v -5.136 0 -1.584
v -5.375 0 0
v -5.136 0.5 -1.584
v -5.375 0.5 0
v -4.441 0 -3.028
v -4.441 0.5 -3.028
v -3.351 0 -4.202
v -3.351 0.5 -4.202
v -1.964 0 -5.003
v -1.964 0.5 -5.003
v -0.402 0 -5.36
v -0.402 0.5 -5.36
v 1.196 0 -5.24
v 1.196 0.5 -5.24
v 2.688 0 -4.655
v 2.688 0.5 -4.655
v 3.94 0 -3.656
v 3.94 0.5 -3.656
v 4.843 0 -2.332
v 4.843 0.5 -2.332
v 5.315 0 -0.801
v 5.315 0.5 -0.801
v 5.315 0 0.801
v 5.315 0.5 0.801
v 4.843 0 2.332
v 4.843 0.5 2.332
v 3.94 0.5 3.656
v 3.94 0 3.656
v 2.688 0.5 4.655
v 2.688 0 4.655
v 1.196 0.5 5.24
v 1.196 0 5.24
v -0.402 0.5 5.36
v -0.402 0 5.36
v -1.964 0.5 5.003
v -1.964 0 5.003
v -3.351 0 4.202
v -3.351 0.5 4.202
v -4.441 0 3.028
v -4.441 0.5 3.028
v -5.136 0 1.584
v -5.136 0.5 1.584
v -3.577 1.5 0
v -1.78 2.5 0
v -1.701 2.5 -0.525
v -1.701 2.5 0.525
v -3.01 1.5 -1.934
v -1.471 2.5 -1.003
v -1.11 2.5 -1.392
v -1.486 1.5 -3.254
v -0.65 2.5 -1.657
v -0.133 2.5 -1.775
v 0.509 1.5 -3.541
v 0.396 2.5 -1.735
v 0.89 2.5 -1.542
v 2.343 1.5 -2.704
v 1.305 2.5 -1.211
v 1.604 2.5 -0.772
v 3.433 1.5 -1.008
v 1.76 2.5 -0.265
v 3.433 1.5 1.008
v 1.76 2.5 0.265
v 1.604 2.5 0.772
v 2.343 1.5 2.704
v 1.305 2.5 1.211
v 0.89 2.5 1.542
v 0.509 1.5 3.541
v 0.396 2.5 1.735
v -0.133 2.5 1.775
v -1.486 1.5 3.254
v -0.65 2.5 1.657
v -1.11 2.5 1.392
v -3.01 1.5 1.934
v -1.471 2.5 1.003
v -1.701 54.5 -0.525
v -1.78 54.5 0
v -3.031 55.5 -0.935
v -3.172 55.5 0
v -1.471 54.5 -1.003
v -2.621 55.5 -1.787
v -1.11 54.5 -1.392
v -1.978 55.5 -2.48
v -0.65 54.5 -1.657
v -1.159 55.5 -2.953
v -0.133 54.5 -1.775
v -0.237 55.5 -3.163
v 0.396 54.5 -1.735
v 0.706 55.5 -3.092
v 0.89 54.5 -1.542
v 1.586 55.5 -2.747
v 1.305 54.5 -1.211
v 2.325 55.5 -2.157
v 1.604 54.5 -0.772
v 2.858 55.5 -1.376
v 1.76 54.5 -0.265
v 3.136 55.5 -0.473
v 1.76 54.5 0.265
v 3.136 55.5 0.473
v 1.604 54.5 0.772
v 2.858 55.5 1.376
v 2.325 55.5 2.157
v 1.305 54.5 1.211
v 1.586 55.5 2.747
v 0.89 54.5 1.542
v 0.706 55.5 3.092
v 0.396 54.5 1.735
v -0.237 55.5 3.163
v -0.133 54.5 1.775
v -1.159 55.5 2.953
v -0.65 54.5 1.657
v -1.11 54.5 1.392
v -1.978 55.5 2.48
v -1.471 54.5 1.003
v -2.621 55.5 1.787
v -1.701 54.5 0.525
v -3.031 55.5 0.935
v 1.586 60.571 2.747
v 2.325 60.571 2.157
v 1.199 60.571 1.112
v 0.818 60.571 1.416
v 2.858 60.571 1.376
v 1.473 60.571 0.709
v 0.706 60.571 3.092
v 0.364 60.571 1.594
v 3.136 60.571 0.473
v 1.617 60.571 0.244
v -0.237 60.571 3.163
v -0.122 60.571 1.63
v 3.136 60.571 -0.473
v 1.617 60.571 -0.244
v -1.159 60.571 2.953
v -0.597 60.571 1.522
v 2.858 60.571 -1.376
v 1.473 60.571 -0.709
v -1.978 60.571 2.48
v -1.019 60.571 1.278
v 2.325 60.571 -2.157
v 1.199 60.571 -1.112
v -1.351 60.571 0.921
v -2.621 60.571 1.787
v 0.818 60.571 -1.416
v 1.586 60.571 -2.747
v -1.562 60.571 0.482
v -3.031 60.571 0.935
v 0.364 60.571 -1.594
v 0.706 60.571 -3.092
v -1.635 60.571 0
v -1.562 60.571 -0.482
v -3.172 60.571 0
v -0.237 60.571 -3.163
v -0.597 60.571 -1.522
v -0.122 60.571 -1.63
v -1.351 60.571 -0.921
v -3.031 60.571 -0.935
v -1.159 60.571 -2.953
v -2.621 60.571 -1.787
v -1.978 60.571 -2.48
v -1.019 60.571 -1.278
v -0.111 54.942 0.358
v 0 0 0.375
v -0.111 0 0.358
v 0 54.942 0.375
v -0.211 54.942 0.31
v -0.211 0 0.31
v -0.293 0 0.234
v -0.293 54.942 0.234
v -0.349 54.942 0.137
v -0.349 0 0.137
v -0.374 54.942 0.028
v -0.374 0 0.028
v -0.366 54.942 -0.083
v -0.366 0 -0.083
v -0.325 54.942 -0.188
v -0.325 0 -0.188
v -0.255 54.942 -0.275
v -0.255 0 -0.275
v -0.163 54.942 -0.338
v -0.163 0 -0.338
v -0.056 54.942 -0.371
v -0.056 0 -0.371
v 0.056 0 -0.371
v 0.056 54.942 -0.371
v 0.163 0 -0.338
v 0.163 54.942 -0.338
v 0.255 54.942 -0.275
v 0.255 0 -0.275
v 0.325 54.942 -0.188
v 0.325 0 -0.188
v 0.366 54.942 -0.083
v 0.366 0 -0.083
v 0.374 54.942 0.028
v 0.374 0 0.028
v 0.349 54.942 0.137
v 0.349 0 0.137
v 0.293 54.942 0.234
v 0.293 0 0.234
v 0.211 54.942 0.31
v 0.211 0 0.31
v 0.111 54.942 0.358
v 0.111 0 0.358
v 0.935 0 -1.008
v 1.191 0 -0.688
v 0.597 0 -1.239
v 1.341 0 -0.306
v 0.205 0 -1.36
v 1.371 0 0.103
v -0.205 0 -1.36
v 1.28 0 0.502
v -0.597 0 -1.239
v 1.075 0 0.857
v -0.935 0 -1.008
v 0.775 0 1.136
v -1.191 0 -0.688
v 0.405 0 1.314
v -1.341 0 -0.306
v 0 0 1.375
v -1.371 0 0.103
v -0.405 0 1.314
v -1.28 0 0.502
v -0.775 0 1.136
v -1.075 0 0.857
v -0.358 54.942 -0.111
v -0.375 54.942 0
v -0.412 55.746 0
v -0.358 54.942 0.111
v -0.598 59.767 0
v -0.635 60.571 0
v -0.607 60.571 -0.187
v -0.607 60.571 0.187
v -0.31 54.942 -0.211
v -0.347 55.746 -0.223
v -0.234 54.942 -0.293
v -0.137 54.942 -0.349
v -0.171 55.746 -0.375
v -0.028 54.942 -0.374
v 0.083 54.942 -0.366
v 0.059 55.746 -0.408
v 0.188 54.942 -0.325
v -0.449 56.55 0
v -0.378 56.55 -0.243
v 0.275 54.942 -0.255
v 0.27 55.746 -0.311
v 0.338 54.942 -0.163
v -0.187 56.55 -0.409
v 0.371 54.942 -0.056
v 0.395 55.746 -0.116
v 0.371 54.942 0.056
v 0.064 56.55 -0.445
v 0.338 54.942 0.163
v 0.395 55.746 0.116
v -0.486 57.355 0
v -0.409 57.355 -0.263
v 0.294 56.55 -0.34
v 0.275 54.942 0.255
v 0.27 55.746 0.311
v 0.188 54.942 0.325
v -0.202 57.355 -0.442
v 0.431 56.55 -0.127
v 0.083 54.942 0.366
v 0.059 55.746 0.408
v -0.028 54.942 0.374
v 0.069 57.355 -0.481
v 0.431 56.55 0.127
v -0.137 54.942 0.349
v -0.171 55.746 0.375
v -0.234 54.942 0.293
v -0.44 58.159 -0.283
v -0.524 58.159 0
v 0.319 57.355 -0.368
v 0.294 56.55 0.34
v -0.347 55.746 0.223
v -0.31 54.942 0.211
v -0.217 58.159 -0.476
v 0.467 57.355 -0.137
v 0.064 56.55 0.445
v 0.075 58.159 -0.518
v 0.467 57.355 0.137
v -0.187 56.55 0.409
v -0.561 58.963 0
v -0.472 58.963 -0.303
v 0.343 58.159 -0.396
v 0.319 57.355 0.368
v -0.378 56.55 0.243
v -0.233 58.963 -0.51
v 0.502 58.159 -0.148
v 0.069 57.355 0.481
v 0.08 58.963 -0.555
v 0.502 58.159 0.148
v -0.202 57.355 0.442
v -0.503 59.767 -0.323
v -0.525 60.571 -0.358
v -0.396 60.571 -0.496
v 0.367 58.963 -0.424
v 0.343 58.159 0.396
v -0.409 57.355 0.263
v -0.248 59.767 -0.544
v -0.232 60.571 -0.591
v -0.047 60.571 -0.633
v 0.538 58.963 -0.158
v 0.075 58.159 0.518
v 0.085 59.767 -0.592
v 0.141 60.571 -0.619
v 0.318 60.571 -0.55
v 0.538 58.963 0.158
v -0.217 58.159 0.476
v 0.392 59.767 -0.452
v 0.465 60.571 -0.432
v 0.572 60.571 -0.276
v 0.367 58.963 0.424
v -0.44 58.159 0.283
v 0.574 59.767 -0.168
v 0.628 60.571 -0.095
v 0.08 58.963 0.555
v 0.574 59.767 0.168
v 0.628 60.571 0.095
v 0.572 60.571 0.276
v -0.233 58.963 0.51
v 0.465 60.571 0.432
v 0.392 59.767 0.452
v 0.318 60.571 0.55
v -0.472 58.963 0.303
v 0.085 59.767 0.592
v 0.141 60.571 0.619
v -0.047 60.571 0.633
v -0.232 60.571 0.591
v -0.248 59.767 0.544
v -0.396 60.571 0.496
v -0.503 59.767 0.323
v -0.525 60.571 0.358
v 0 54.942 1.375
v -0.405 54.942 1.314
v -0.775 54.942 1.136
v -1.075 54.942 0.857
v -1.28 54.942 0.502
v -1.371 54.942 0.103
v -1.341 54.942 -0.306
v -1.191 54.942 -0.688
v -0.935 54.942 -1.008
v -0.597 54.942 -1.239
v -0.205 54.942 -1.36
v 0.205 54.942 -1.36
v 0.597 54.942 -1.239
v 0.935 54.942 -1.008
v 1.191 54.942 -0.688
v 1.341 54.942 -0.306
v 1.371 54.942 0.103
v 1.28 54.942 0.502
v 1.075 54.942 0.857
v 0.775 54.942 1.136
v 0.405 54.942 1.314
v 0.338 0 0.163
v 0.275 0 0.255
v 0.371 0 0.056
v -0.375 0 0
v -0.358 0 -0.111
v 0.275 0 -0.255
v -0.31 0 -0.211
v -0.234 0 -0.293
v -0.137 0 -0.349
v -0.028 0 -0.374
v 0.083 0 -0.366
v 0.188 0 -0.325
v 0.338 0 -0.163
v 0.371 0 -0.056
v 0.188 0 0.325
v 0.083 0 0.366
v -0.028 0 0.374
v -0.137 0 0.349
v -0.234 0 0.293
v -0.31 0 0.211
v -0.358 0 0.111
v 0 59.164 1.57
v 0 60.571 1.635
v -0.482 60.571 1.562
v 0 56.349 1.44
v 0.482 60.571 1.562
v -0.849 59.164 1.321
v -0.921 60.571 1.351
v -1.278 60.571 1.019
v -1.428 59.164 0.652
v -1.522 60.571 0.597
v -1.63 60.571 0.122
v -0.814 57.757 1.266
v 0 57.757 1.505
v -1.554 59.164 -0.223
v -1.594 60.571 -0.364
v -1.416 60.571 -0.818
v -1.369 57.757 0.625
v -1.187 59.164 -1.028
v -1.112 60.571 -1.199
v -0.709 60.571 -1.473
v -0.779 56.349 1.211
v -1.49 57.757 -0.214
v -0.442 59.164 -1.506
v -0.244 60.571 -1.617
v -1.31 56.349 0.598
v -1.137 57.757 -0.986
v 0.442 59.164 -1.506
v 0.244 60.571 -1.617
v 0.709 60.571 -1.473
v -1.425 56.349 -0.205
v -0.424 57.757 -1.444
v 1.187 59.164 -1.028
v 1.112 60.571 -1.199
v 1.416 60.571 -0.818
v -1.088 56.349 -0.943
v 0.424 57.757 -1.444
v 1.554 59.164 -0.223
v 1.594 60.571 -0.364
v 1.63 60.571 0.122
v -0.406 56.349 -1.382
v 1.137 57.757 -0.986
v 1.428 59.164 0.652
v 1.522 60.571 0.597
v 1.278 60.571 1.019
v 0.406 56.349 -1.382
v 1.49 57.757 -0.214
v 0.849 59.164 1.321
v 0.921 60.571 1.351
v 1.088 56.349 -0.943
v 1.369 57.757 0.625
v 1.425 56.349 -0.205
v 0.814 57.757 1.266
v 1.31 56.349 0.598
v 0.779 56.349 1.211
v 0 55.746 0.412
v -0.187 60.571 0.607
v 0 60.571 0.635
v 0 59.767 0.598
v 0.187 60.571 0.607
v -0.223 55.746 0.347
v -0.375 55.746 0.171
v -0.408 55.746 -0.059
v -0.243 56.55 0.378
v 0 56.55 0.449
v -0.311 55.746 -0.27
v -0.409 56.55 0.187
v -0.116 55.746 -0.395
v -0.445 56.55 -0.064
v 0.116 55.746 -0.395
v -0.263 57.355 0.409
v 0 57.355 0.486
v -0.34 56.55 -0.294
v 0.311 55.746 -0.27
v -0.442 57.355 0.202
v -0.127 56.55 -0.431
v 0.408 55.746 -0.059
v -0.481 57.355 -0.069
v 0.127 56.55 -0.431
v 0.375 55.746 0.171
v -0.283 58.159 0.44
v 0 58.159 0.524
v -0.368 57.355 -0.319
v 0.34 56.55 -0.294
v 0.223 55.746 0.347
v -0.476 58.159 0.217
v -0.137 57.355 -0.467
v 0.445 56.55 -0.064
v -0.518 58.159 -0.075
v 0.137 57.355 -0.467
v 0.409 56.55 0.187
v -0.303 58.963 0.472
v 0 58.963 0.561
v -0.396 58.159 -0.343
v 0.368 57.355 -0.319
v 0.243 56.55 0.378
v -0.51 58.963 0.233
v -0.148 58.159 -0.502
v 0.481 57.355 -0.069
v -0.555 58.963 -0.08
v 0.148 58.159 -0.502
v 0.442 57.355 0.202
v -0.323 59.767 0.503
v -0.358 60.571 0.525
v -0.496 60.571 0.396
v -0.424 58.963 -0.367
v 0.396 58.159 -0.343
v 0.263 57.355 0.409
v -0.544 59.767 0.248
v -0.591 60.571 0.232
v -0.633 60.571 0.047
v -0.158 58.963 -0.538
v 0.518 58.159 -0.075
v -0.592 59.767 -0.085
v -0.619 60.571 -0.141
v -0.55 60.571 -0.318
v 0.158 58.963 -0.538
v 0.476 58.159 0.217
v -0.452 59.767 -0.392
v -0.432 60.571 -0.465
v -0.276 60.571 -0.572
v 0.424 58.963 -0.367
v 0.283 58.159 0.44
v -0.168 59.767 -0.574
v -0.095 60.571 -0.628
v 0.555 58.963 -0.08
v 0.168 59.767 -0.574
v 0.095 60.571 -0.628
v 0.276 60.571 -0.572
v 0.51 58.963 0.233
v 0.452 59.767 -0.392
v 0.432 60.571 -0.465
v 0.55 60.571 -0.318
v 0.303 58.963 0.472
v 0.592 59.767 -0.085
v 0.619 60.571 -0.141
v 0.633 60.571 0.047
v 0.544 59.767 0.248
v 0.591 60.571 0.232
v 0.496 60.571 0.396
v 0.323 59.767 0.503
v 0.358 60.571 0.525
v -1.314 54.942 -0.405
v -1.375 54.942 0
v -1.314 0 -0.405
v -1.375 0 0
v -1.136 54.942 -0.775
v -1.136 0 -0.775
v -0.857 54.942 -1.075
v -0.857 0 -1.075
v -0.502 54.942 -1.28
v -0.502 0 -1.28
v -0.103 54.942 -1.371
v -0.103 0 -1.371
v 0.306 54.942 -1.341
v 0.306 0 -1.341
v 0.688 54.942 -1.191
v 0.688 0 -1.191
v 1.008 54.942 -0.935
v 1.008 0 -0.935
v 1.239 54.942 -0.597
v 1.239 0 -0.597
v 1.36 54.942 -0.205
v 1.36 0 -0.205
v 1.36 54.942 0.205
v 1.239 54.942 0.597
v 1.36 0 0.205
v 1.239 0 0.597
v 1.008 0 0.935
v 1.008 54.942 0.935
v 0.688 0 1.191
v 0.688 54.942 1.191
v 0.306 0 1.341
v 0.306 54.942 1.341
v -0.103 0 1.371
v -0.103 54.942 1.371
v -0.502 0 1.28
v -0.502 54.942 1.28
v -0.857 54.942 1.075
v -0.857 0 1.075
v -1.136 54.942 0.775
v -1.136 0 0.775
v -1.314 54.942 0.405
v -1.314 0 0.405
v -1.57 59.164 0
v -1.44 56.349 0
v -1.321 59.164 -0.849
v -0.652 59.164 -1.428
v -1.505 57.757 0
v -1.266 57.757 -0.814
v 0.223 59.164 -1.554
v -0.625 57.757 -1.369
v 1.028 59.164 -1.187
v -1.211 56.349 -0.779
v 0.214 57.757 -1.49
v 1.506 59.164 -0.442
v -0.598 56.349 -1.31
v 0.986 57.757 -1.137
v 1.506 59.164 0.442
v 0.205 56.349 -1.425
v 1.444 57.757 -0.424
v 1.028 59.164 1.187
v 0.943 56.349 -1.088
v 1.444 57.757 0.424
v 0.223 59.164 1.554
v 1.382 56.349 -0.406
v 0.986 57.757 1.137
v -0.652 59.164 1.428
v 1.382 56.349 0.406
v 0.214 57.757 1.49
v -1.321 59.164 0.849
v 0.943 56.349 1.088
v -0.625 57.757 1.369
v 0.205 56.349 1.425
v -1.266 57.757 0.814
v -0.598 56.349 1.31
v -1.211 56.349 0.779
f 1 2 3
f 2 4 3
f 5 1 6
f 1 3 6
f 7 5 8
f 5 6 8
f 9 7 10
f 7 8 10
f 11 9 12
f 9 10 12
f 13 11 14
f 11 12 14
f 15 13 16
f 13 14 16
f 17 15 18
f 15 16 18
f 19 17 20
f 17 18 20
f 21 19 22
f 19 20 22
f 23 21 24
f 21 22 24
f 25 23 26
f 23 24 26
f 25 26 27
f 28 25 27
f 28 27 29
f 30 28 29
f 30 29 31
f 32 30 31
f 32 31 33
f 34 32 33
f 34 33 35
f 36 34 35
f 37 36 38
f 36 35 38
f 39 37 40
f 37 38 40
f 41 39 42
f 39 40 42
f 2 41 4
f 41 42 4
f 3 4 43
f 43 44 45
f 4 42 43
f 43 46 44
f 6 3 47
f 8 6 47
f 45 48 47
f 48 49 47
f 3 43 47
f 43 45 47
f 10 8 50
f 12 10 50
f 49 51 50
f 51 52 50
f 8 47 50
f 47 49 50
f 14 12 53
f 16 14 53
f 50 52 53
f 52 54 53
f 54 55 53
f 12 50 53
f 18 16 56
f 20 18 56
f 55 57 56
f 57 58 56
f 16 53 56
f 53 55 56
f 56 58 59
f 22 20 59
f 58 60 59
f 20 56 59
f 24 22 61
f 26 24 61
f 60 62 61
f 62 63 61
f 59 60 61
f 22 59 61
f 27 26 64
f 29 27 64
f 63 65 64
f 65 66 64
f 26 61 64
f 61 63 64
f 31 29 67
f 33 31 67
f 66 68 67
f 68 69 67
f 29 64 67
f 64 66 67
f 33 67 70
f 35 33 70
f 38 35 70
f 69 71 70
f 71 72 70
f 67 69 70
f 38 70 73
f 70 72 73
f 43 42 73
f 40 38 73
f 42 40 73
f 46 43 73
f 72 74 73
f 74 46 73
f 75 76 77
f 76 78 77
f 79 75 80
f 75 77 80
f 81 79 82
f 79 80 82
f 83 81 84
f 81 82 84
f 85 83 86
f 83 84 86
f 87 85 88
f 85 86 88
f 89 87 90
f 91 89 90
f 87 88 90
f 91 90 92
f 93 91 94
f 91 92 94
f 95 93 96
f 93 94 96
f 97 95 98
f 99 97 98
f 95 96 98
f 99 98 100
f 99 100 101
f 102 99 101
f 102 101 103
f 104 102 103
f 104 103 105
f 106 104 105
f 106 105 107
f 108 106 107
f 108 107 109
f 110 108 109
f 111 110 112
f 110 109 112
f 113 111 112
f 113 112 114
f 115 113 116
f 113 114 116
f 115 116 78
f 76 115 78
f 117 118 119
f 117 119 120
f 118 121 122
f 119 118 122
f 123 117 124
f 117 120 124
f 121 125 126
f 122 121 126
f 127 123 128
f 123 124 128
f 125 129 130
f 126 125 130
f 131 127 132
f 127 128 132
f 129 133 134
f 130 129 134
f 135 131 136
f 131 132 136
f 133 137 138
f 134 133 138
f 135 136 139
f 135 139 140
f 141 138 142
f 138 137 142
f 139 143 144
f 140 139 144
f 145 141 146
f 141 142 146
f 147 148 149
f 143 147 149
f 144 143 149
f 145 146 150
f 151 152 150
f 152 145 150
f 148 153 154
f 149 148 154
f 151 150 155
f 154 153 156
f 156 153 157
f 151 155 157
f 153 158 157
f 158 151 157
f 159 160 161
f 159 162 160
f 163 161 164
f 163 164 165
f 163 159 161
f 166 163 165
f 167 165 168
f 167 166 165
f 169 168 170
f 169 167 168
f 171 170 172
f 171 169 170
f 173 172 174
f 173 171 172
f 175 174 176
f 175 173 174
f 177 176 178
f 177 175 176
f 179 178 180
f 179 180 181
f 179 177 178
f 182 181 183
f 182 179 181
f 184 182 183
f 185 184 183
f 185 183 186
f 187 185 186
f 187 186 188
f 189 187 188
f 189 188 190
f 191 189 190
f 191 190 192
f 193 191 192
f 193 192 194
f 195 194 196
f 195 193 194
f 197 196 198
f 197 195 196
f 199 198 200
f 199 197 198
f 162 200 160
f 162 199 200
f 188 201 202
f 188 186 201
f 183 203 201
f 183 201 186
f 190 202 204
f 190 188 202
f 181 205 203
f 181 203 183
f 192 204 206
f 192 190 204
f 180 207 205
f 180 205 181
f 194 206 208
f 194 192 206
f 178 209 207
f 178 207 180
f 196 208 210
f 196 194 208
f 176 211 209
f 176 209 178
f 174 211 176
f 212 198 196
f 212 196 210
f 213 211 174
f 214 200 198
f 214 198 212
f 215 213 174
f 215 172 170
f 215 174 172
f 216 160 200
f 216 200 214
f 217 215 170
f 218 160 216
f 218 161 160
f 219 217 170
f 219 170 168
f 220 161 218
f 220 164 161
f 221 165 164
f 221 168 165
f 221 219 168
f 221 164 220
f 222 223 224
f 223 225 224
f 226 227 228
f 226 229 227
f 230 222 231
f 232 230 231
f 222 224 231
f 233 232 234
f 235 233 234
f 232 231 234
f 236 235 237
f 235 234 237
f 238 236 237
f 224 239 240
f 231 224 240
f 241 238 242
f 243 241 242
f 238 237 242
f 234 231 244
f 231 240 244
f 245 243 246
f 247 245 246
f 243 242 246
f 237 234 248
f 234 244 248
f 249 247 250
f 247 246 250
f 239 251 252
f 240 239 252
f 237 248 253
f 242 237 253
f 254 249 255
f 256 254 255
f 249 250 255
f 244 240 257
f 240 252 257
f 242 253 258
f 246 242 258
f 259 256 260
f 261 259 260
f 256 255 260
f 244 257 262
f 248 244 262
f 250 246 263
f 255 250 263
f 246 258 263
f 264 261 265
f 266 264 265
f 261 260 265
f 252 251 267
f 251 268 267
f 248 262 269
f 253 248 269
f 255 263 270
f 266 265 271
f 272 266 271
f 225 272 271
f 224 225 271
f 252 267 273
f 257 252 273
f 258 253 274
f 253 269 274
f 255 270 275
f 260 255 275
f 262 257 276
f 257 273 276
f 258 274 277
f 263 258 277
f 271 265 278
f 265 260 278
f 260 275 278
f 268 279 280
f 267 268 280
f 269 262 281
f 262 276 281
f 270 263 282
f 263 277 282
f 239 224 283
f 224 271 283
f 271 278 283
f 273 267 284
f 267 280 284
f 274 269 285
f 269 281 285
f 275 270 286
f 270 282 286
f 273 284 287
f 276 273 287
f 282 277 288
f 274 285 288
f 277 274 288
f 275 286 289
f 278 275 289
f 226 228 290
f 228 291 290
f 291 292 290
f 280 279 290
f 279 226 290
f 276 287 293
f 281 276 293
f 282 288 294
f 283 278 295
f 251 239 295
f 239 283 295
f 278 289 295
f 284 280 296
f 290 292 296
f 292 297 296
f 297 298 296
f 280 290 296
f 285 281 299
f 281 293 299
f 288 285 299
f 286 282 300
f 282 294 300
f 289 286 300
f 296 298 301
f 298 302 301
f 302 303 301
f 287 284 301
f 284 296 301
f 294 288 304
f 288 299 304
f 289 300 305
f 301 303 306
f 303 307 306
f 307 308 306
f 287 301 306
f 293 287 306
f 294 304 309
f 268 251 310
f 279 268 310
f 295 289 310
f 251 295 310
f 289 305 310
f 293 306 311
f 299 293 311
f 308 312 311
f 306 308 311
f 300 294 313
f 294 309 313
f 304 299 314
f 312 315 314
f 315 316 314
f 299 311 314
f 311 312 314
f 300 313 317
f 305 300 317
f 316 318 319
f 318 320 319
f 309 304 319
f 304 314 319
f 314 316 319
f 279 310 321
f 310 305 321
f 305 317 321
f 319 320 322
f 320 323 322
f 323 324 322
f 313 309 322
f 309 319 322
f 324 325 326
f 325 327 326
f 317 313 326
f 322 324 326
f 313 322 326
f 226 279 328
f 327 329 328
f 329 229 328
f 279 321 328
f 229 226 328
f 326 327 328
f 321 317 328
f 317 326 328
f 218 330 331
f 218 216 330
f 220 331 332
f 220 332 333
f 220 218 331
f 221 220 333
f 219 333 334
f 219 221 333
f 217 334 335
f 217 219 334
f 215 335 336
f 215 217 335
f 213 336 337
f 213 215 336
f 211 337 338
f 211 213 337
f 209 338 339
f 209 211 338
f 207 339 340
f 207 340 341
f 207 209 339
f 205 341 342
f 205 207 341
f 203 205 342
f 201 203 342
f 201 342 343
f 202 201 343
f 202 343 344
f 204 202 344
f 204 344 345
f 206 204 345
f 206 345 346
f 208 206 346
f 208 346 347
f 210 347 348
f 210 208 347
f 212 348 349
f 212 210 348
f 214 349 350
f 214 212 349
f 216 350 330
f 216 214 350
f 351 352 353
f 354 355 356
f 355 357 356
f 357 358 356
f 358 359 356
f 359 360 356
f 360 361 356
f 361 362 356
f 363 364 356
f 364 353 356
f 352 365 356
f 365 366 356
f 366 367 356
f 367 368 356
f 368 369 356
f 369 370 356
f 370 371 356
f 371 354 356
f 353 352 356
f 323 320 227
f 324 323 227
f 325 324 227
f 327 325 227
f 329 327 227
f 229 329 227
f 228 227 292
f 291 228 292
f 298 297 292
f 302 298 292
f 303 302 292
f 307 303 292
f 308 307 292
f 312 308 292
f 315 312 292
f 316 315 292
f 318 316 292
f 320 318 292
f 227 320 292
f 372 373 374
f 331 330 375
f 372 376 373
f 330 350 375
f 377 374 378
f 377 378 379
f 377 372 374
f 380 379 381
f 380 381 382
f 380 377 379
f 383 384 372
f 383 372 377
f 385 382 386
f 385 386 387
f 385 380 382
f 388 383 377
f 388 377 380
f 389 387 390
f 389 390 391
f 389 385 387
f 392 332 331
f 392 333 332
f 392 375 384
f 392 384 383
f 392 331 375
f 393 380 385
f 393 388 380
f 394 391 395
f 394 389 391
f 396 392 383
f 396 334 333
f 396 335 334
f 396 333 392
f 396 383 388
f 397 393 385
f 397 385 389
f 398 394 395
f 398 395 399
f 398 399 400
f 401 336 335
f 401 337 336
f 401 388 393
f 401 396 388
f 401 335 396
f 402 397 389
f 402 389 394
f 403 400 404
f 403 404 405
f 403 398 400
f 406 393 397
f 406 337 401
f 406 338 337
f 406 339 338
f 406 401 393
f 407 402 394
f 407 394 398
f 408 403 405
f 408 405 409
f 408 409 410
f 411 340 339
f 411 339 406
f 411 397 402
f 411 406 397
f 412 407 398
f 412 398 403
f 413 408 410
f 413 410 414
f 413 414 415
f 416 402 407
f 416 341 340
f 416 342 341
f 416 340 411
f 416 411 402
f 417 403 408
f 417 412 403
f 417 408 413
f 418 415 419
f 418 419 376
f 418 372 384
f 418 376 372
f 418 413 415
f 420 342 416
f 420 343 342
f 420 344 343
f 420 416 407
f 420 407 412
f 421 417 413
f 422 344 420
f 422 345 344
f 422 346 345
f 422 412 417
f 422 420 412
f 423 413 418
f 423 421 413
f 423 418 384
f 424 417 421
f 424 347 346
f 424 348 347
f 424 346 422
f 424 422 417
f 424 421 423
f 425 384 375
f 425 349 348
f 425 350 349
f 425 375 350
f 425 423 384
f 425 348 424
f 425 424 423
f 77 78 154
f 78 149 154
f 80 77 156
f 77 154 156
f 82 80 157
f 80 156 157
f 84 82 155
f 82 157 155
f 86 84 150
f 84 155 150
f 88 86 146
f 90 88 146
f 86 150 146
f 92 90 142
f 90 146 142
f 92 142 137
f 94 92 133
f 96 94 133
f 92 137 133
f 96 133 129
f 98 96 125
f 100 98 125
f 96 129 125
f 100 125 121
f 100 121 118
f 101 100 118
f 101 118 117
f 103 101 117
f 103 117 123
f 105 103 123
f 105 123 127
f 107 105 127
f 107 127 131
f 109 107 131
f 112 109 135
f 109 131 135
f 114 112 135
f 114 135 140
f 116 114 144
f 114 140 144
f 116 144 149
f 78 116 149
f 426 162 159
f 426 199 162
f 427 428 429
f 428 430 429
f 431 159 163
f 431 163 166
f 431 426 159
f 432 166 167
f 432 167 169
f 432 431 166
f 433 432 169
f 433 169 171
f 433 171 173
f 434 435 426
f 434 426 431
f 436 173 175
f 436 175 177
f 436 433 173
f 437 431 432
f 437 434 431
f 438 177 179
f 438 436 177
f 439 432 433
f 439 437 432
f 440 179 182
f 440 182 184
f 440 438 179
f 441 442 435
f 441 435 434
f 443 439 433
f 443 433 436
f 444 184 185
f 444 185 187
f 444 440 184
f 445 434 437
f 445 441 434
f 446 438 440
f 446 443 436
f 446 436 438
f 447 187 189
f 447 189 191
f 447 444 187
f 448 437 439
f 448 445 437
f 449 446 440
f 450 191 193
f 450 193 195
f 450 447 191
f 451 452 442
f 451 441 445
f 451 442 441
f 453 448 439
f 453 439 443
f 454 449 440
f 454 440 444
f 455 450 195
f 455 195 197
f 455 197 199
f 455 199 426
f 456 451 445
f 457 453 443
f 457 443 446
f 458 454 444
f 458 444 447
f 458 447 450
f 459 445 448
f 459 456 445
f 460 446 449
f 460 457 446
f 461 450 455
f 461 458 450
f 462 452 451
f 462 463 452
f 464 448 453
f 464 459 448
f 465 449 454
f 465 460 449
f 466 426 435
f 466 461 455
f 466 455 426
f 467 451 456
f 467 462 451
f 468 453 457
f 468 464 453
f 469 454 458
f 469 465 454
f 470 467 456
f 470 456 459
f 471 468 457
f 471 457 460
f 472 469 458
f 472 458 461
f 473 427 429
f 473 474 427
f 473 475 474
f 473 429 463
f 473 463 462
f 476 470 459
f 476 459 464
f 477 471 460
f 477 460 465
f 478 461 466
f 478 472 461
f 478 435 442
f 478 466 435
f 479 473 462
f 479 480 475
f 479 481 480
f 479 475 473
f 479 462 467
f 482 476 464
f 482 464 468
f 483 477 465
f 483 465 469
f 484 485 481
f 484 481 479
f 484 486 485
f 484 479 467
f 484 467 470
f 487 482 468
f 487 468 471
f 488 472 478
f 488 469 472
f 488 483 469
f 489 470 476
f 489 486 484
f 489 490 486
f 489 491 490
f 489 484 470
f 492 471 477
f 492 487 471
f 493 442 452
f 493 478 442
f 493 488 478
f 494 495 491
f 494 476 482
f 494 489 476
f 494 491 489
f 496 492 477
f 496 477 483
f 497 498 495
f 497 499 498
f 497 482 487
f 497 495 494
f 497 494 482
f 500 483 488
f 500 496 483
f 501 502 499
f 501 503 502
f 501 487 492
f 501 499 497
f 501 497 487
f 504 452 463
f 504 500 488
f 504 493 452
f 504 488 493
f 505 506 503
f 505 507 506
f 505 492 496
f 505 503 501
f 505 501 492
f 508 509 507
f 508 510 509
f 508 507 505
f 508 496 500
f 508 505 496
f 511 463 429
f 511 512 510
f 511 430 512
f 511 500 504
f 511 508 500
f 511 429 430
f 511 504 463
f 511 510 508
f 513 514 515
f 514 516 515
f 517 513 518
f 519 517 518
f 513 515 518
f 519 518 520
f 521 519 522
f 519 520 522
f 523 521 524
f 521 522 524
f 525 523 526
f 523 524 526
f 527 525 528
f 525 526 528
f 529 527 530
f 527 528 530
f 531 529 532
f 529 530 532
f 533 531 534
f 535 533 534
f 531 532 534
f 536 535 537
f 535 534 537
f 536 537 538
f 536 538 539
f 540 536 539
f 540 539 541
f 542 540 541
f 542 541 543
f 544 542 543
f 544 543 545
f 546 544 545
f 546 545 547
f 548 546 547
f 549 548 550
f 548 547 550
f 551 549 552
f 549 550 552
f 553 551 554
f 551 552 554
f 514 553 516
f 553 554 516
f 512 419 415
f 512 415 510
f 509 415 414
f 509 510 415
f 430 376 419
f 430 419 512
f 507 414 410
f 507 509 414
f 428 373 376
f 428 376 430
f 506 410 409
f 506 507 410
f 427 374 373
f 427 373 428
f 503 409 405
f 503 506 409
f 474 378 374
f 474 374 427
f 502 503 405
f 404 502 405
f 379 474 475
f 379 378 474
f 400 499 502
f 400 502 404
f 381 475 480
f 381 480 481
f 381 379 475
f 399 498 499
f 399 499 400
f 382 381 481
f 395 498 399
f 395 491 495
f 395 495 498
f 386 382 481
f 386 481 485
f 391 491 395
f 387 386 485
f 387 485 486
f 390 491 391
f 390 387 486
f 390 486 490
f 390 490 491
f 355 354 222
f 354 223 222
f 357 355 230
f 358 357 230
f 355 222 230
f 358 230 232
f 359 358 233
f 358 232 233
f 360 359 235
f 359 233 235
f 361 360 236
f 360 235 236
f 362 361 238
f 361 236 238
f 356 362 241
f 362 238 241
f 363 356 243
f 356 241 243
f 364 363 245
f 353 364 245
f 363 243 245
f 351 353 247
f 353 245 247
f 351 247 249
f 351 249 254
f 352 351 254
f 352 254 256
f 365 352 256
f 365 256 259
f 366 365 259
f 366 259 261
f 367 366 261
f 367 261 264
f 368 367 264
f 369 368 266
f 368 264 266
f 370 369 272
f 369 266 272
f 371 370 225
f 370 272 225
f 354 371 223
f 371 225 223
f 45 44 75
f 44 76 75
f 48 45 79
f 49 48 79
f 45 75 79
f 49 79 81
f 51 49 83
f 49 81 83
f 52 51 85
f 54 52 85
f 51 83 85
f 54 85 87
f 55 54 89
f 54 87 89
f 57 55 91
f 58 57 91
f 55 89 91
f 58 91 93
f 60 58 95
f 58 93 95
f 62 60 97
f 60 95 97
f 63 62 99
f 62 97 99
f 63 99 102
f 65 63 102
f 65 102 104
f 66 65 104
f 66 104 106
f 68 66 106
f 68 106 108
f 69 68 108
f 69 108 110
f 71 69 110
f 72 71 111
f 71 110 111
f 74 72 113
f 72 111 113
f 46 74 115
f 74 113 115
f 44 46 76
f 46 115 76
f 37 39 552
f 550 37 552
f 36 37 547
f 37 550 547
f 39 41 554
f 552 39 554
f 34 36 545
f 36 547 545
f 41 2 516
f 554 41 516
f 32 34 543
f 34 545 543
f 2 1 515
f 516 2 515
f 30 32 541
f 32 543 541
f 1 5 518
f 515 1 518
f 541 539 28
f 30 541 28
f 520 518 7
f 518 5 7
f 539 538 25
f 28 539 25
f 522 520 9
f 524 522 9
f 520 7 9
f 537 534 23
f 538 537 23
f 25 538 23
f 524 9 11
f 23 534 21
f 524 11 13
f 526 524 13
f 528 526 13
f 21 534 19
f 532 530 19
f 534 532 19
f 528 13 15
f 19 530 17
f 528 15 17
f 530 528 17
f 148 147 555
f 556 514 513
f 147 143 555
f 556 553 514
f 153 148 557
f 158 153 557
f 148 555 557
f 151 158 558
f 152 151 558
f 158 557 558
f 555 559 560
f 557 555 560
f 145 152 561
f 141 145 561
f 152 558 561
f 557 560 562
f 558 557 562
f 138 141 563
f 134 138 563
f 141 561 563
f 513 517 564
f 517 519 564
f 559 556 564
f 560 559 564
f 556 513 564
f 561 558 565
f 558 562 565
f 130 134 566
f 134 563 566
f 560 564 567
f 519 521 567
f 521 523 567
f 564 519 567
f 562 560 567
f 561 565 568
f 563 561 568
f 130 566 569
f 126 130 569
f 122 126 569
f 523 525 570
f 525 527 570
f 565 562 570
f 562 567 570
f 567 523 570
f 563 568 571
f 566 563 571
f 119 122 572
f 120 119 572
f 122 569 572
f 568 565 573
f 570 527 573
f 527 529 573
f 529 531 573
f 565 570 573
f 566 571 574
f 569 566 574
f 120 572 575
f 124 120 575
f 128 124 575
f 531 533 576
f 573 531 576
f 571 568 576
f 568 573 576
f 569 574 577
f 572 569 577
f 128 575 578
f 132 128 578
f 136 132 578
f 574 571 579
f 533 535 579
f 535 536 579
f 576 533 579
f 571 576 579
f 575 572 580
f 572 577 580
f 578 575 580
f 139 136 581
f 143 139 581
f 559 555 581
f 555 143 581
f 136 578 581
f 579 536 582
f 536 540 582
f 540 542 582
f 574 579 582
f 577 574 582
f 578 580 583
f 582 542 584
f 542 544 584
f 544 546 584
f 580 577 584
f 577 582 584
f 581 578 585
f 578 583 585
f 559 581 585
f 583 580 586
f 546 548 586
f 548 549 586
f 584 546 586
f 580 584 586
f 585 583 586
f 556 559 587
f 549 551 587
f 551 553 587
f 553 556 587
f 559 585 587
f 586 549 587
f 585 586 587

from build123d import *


with BuildPart() as part:
    # Croquis1 → Revolución1 (revolve)
    with BuildSketch(Plane.XY, mode=Mode.PRIVATE) as revoluci_n1_sk:
        Polygon((5.375, 0), (5.375, 0.5), (1.78, 2.5), (1.78, 54.5), (3.171785891, 55.5), (3.171785891, 60.571), (1.635, 60.571), (1.375, 54.942193309), (1.375, 0), align=None)
        Polygon((0.375, 0), (0.375, 54.942193309), (0.635, 60.571), (0.442390715, 60.571), (0, 60.571), (0, 0), align=None)
    revolve(revoluci_n1_sk.sketch.rotate(Axis((0, 60.571, 0), (0, -1, 0)), 180), axis=Axis((0, 60.571, 0), (0, -1, 0)))


with BuildPart() as body_2:
    # Croquis3 → Revolución2 (revolve)
    with BuildSketch(Plane.XY, mode=Mode.PRIVATE) as revoluci_n2_sk:
        Polygon((0.375, 54.942193309), (0.635, 60.571), (1.635, 60.571), (1.375, 54.942193309), (1.375, 0), (0.375, 0), align=None)
    revolve(revoluci_n2_sk.sketch.rotate(Axis((0, 55.5, 0), (0, -1, 0)), 90), axis=Axis((0, 55.5, 0), (0, -1, 0)))


solid = Compound([part.part, body_2.part])
